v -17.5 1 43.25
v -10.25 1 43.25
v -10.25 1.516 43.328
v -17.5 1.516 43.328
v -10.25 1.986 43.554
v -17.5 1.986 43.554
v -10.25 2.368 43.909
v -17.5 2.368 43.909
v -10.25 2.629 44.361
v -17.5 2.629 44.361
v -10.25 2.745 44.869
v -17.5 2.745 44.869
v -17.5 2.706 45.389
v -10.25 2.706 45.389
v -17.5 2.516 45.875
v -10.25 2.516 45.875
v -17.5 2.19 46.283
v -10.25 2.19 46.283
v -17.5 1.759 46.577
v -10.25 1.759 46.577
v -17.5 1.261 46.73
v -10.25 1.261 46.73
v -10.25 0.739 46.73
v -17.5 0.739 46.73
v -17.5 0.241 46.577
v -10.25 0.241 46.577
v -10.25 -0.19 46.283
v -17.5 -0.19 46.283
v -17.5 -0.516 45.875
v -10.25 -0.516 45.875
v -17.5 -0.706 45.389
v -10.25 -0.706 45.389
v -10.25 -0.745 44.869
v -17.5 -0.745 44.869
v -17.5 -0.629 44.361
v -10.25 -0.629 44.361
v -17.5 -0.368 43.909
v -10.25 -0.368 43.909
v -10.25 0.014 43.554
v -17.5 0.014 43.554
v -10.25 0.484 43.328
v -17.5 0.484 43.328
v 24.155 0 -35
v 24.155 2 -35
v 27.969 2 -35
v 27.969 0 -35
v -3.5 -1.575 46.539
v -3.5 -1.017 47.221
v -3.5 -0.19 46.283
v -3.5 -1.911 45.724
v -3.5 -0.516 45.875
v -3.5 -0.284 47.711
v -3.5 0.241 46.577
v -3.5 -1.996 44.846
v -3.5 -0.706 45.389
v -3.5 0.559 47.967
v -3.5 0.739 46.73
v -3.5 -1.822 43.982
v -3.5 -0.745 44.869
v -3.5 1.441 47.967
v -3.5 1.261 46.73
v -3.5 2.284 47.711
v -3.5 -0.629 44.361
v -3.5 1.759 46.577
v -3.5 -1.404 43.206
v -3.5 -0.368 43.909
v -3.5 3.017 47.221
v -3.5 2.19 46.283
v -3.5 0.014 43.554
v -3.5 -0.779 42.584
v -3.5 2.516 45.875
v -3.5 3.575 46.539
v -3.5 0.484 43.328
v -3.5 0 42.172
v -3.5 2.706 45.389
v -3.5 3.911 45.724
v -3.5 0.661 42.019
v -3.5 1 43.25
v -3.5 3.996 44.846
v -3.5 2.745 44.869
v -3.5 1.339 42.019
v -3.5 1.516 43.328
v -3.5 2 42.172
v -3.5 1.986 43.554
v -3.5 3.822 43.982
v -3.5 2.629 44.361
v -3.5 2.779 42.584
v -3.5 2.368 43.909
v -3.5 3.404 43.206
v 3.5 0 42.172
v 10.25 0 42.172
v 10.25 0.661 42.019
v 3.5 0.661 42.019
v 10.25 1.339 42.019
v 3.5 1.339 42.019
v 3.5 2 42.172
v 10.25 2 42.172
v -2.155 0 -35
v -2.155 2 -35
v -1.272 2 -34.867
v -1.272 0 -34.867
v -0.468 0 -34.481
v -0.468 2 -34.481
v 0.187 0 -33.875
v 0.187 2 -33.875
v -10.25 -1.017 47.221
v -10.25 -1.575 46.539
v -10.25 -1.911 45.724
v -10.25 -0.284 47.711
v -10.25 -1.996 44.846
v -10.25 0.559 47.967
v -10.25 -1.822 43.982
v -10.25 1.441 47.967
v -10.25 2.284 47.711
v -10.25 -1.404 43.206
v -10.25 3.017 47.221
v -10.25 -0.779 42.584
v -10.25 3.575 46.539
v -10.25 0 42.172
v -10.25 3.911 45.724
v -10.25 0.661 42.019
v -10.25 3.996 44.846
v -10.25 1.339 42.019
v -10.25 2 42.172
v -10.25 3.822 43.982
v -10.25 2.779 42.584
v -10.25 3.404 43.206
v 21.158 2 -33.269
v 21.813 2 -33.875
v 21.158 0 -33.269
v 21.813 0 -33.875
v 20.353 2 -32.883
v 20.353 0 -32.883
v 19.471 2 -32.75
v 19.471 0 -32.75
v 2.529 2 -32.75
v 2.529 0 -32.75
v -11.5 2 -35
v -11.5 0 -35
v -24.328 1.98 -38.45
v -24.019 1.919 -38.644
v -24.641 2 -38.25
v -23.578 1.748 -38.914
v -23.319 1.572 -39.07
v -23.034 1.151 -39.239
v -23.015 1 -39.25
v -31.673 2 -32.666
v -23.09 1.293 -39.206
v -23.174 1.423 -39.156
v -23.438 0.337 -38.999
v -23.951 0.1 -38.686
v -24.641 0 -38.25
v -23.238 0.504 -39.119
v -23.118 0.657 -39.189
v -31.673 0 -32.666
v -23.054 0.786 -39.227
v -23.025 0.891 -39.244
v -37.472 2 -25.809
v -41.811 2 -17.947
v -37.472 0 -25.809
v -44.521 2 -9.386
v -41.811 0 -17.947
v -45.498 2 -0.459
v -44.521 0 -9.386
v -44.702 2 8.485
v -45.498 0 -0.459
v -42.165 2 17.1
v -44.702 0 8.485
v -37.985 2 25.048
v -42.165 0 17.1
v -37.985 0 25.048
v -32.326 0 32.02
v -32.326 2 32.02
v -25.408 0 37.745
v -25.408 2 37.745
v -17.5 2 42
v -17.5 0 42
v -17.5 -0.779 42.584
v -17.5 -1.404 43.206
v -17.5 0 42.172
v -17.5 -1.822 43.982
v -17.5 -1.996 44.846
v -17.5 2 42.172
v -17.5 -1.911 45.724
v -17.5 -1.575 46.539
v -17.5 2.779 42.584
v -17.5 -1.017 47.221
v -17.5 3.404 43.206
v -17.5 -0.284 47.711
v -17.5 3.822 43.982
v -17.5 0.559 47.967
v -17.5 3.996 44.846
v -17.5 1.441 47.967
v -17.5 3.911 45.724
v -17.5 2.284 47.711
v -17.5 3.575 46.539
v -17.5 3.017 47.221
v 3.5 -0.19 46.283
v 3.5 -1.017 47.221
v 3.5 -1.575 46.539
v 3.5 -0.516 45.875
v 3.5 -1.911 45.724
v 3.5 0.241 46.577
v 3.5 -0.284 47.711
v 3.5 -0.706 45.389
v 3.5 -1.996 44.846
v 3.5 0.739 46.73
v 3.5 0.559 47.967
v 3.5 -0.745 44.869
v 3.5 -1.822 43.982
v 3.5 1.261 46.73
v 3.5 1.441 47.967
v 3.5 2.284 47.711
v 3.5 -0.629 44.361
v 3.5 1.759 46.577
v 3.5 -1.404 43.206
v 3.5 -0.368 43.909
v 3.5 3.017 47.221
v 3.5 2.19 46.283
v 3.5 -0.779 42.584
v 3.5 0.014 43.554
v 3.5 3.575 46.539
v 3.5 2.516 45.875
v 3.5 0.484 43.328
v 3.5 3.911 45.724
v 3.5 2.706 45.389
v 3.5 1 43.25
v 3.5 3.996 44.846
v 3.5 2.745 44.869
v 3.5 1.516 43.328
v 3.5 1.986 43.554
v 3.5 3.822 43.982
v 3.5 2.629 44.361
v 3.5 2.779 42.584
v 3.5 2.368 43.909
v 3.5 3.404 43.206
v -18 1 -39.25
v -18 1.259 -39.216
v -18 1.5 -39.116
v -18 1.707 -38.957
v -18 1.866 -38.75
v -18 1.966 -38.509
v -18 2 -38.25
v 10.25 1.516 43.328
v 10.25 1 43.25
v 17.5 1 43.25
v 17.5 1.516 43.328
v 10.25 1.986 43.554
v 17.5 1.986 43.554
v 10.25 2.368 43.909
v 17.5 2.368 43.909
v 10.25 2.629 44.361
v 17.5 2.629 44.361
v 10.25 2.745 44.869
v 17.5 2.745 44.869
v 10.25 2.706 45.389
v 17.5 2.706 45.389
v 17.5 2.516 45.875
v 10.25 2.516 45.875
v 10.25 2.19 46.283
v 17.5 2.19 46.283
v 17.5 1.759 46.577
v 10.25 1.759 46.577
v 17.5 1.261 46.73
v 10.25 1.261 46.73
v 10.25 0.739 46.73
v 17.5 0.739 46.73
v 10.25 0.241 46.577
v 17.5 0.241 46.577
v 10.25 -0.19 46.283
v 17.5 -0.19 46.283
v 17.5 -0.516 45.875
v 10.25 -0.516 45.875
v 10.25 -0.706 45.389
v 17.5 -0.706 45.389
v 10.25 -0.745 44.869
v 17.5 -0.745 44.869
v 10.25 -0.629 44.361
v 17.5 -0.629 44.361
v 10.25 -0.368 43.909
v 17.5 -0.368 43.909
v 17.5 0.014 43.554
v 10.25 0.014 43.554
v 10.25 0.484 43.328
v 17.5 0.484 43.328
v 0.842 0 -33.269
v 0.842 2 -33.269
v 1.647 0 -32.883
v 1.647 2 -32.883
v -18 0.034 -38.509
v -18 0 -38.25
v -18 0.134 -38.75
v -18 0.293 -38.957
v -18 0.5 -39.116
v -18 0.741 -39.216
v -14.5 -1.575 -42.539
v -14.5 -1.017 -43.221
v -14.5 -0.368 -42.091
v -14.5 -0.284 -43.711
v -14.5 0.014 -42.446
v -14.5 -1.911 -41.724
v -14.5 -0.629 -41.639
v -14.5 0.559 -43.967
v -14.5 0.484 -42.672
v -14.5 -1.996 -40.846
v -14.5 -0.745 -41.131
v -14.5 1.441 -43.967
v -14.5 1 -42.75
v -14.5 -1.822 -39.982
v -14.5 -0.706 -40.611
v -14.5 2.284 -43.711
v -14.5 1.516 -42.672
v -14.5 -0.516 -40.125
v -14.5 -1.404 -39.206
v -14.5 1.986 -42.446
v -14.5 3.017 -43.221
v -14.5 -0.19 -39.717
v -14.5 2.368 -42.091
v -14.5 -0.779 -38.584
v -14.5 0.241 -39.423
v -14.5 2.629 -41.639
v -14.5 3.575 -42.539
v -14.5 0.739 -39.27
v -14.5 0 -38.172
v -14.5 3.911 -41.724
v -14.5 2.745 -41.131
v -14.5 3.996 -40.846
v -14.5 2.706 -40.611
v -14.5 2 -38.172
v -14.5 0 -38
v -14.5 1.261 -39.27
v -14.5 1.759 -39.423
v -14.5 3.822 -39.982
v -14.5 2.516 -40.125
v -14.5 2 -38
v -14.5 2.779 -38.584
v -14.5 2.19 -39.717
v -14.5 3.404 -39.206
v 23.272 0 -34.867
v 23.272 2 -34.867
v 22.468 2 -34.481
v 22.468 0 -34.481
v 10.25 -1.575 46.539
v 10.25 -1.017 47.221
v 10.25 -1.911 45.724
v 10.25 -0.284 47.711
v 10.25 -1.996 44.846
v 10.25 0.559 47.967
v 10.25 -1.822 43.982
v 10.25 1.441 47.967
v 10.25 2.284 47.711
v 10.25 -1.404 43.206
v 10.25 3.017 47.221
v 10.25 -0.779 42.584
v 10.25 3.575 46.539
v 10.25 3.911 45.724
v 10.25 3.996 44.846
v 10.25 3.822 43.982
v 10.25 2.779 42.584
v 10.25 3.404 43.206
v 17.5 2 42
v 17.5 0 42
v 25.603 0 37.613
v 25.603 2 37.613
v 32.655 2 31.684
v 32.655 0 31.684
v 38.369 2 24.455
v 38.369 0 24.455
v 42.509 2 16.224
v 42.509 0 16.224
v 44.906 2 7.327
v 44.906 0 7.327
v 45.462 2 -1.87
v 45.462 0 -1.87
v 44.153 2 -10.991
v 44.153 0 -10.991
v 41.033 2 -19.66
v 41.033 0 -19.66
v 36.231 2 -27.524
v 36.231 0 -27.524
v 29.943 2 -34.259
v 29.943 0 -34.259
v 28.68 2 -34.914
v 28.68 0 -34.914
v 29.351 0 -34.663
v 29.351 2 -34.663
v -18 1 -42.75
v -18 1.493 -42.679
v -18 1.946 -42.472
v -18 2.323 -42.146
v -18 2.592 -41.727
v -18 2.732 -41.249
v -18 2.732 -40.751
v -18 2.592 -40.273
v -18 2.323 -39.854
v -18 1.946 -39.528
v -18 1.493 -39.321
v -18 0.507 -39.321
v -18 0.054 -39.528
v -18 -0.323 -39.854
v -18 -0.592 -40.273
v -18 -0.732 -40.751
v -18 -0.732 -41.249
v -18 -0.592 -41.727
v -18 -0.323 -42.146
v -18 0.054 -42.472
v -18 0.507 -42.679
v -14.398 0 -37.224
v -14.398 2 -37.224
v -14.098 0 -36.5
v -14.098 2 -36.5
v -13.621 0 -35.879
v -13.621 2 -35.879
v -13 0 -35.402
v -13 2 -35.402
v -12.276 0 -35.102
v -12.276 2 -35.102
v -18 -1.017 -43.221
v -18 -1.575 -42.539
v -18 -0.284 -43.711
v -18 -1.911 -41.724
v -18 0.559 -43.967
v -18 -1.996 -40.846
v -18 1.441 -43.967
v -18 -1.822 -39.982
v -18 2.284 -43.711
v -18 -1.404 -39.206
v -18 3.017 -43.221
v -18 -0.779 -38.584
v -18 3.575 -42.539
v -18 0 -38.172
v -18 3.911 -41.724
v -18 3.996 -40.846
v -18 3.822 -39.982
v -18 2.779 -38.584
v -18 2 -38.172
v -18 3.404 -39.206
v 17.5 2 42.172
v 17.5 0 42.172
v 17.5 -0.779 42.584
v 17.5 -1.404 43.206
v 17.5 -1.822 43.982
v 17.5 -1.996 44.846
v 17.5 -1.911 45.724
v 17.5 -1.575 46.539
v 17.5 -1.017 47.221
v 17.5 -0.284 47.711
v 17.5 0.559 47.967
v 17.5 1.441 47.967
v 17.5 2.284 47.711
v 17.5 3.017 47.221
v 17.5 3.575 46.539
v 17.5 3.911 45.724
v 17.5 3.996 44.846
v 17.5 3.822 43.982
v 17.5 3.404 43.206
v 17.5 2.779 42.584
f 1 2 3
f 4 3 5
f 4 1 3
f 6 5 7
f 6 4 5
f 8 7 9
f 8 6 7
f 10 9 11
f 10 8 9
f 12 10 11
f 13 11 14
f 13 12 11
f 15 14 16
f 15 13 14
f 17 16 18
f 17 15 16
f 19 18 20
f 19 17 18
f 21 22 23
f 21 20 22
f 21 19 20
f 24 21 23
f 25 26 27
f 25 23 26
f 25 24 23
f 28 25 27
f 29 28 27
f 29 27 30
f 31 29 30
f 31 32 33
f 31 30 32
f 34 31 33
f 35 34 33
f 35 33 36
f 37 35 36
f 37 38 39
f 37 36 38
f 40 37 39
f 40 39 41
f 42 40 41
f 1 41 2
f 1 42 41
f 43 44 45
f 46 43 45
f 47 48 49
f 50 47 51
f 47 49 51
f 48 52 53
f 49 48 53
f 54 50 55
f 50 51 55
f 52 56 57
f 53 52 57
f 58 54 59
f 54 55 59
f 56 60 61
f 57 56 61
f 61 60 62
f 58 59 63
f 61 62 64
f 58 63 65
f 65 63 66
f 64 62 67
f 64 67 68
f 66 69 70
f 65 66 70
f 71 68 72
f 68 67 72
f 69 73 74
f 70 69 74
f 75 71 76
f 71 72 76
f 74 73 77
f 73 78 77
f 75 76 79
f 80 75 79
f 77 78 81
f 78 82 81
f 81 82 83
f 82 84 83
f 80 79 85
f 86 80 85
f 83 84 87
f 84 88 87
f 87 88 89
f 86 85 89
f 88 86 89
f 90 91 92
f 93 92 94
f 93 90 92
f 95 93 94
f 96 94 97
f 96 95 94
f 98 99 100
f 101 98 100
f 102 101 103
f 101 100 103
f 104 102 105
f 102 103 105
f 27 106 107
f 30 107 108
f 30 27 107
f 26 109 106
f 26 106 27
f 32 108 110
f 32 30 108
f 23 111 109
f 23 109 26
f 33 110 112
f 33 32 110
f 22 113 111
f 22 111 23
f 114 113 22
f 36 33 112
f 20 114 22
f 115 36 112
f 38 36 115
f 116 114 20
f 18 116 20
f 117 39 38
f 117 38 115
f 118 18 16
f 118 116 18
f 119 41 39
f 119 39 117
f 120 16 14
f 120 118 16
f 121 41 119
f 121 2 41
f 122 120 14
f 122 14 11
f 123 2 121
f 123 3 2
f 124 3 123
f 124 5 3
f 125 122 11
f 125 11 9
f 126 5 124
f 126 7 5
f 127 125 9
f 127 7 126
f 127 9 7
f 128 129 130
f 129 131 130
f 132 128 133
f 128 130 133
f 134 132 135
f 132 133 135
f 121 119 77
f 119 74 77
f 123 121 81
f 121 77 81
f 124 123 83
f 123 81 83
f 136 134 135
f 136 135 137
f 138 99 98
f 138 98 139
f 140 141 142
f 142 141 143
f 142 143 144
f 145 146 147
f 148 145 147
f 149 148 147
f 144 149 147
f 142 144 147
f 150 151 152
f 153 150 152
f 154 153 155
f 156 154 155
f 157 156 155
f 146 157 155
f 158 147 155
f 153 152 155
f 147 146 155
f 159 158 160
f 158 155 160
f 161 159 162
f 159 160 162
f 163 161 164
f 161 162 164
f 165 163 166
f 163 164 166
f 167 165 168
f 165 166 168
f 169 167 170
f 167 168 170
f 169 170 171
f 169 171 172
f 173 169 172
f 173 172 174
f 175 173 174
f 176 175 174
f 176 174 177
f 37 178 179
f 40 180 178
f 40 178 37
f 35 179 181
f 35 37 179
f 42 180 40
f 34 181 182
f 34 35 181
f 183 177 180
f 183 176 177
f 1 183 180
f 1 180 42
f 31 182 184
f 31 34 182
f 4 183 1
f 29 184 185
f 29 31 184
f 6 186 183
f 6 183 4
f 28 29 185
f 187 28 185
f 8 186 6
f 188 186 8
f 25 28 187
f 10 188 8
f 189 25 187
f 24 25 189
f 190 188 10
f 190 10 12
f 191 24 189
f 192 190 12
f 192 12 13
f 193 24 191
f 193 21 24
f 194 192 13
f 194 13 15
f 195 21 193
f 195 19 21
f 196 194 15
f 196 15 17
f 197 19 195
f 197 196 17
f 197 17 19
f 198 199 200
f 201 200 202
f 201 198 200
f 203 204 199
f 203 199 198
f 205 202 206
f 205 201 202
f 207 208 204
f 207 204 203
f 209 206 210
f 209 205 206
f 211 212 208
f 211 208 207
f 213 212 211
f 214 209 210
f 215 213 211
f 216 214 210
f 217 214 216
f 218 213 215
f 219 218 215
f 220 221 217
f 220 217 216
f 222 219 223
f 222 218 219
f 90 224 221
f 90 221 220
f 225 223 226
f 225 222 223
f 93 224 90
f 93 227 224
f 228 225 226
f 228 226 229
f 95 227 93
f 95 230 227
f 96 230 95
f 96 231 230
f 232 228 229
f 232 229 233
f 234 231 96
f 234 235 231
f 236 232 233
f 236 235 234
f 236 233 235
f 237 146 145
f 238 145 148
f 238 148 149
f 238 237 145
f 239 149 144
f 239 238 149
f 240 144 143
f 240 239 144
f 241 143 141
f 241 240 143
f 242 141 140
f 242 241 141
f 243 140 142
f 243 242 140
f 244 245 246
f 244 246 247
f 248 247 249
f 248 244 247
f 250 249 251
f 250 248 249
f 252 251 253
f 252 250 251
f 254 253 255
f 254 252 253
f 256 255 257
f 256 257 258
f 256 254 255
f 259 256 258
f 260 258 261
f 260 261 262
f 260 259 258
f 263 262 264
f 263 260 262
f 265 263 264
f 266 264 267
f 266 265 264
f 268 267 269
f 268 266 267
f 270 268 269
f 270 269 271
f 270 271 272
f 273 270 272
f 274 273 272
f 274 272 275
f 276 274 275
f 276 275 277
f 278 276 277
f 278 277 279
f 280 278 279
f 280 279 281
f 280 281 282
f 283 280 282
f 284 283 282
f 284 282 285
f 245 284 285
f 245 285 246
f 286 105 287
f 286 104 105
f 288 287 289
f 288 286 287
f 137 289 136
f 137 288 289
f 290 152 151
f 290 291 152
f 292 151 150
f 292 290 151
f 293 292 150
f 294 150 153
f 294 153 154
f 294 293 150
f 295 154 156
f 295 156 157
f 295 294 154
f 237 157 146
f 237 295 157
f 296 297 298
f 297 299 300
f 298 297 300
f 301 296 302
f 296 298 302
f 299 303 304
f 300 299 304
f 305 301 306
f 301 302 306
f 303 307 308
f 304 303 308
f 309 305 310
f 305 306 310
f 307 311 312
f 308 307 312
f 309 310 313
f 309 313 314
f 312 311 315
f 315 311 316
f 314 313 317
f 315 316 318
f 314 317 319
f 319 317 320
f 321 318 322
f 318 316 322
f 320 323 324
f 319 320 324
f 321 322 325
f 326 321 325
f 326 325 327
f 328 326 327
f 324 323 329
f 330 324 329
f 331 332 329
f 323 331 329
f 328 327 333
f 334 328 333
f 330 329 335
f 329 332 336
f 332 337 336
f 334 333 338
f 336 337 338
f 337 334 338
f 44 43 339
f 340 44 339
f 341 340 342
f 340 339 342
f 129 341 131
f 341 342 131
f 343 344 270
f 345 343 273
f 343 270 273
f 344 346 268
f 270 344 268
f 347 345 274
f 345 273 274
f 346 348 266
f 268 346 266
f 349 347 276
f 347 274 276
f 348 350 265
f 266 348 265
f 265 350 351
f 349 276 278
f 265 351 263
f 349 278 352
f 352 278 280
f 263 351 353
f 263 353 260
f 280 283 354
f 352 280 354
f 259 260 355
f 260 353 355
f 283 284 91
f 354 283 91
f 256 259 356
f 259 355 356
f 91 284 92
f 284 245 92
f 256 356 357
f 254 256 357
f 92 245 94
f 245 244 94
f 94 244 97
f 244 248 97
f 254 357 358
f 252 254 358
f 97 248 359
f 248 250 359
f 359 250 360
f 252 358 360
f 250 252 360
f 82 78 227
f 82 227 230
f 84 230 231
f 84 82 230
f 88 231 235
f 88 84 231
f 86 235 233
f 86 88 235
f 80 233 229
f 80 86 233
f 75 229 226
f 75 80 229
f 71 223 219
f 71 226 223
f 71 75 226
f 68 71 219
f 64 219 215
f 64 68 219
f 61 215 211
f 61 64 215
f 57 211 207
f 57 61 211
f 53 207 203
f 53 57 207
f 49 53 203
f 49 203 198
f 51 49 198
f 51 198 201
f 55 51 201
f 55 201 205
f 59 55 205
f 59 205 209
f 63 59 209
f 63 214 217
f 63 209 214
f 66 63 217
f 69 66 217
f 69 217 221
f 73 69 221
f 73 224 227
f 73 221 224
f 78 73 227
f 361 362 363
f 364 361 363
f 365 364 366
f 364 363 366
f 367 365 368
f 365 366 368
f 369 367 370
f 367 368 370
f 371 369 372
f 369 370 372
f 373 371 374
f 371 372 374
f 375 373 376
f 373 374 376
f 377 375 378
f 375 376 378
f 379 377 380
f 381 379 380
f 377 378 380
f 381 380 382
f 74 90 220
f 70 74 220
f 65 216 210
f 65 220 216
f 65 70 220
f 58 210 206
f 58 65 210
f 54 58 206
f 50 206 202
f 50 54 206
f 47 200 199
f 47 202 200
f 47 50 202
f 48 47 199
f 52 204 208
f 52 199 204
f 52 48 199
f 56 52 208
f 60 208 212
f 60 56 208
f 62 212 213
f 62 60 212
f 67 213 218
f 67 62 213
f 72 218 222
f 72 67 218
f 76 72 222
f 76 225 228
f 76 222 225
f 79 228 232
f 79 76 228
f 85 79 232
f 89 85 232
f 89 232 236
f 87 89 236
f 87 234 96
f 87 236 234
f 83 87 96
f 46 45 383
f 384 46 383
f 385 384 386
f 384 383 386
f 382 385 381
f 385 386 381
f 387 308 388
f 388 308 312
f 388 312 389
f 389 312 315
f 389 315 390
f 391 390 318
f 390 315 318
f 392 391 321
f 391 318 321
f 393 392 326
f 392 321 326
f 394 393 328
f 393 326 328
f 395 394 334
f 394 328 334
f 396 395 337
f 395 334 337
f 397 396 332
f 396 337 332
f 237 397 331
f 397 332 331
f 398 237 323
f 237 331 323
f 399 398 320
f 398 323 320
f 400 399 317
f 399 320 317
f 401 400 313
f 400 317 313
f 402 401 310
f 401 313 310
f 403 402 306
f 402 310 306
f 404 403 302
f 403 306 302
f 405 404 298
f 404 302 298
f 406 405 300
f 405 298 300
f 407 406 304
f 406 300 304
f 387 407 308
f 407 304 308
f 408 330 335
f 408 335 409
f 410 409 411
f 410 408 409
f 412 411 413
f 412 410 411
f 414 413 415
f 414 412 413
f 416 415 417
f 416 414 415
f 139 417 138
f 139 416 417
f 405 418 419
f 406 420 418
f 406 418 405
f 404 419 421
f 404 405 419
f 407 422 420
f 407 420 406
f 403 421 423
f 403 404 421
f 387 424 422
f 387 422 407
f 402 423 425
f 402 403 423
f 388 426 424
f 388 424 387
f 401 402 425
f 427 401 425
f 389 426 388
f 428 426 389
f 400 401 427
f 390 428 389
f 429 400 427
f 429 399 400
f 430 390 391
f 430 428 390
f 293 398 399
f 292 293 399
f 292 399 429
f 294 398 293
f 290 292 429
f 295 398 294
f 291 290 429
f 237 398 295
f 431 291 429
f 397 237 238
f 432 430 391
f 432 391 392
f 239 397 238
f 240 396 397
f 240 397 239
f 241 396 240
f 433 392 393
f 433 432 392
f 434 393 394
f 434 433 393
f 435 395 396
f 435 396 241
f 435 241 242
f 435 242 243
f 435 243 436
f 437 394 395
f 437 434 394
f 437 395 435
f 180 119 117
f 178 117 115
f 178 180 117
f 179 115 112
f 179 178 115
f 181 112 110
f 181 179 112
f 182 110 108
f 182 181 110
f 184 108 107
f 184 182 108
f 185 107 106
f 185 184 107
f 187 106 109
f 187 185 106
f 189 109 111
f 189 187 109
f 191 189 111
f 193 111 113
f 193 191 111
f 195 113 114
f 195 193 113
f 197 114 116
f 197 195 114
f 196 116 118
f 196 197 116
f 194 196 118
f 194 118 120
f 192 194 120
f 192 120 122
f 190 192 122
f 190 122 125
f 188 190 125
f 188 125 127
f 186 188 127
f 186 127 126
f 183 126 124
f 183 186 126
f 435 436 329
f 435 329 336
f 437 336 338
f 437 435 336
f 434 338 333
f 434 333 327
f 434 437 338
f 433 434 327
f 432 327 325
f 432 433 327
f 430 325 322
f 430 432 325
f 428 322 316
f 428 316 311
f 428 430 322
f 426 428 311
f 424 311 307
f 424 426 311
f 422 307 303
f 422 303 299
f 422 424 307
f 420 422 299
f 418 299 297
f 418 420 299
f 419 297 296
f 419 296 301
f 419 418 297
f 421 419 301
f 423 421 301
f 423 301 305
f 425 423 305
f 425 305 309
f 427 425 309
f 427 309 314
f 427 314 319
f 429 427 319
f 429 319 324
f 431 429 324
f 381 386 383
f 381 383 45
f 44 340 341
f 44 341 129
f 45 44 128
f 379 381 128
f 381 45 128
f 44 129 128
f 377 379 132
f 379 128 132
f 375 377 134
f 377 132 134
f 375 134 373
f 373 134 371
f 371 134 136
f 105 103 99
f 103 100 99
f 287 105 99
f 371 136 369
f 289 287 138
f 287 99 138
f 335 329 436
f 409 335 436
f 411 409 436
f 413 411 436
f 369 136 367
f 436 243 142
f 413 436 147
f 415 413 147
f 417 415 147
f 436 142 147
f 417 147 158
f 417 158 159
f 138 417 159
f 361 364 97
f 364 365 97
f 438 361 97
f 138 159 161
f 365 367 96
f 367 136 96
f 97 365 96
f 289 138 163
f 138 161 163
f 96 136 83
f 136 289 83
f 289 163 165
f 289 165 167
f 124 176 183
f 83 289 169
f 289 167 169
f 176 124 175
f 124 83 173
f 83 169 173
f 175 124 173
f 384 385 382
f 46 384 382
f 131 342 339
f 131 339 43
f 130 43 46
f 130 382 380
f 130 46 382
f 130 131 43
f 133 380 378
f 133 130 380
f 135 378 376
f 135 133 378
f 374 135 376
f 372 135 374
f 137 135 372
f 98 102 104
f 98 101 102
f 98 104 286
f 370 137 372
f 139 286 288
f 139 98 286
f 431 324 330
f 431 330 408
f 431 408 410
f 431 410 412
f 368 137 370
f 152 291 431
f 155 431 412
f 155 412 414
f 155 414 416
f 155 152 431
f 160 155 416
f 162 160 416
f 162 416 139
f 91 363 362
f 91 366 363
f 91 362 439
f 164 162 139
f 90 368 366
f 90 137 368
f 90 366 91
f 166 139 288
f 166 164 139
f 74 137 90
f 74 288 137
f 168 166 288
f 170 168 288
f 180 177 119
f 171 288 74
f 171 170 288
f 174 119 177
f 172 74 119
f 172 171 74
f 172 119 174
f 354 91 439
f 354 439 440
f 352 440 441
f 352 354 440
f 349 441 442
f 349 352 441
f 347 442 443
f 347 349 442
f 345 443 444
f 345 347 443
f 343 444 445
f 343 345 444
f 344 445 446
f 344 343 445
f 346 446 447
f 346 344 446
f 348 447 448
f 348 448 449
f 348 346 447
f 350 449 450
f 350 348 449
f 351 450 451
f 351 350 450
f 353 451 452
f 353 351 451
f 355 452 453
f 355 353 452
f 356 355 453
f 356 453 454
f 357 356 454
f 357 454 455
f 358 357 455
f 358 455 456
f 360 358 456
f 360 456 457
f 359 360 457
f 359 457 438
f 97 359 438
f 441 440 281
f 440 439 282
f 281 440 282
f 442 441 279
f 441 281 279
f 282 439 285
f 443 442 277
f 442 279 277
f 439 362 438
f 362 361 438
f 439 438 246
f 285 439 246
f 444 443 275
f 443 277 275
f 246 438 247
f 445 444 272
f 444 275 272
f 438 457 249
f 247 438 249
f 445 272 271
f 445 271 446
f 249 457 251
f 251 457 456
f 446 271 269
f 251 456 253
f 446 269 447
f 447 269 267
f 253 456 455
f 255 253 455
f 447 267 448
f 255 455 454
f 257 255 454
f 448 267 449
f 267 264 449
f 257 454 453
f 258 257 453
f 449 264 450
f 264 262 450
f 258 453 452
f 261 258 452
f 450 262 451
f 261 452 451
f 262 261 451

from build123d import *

# Parameters (mm, degrees)
BOSS_EXTRUDE1_DEPTH = 2
BOSS_EXTRUDE2_START = -17.5
SKETCH2_R           = 1.75
BOSS_EXTRUDE2_DEPTH = 35
SKETCH3_R           = 3
CUT_EXTRUDE1_DEPTH  = 6.75
CUT_EXTRUDE2_DEPTH  = 2
BOSS_EXTRUDE4_START = -0.5
BOSS_EXTRUDE4_DEPTH = 3.5
SKETCH6_R           = 1.75
CUT_EXTRUDE3_DEPTH  = 77.941536247
FILLET1_R           = 1
SKETCH7_W           = 9
SKETCH7_H           = 6
CUT_EXTRUDE4_DEPTH  = 2
FILLET2_R           = 3
FILLET3_R           = 3


# Some blends are built 0.0001 mm under size
with BuildPart() as part:
    # Sketch1 → Boss-Extrude1 (new body)
    with BuildSketch(Plane(origin=(0, 0, 0), x_dir=(1, 0, 0), z_dir=(0, 1, 0))):
        with BuildLine():
            Line((-17.5, -42), (17.5, -42))
            ThreePointArc((17.5, -42), (45.5, 0), (17.5, 42))
            Line((17.5, 42), (-17.5, 42))
            ThreePointArc((-17.5, 42), (-45.5, 0), (-17.5, -42))
        make_face()
    extrude(amount=BOSS_EXTRUDE1_DEPTH)

    # Sketch2 → Boss-Extrude2 (add)
    with BuildSketch(Plane(origin=(0, 0, 0), x_dir=(0, 0, -1), z_dir=(1, 0, 0)).offset(BOSS_EXTRUDE2_START)):
        with BuildLine():
            Line((-42, 0), (-42.171572875, 0))
            ThreePointArc((-42.171572875, 0), (-48, 1), (-42.171572875, 2))
            Line((-42.171572875, 2), (-42, 2))
            Line((-42, 2), (-42, 1))
            Line((-42, 1), (-42, 0))
        make_face()
        with Locations((-45, 1)):
            Circle(SKETCH2_R, mode=Mode.SUBTRACT)
    extrude(amount=BOSS_EXTRUDE2_DEPTH)

    # Sketch3 → Cut-Extrude1 (cut)
    with BuildSketch(Plane(origin=(3.5, 0, 0), x_dir=(0, 0, -1), z_dir=(1, 0, 0))):
        with Locations((-45, 1)):
            Circle(SKETCH3_R)
    cut_extrude1 = extrude(amount=CUT_EXTRUDE1_DEPTH, mode=Mode.SUBTRACT)

    # Mirror1: Cut-Extrude1 across plane
    add(cut_extrude1.mirror(Plane(origin=(0, 0, 0), x_dir=(0, 0, 1), z_dir=(1, 0, 0))), mode=Mode.SUBTRACT)

    # Sketch4 → Cut-Extrude2 (cut)
    with BuildSketch(Plane(origin=(0, 2, 0), x_dir=(1, 0, 0), z_dir=(0, 1, 0))):
        Polygon((0.75, 42), (21.25, 42), (21.25, 32.75), (0.75, 32.75), (0.75, 35), (-17.5, 35), (-17.5, 42), align=None)
    extrude(amount=-CUT_EXTRUDE2_DEPTH, mode=Mode.SUBTRACT)

    # Sketch5 → Boss-Extrude4 (add)
    with BuildSketch(Plane(origin=(-17.5, 0, 0), x_dir=(0, 0, -1), z_dir=(1, 0, 0)).offset(BOSS_EXTRUDE4_START)):
        with BuildLine():
            Line((35, 1), (35, 2))
            Line((35, 2), (38.171572875, 2))
            ThreePointArc((38.171572875, 2), (44, 1), (38.171572875, 0))
            Line((38.171572875, 0), (35, 0))
            Line((35, 0), (35, 1))
        make_face()
    extrude(amount=BOSS_EXTRUDE4_DEPTH)

    # Sketch6 → Cut-Extrude3 (cut, through all)
    with BuildSketch(Plane(origin=(-14.5, 0, 0), x_dir=(0, 0, -1), z_dir=(1, 0, 0))):
        with Locations((41, 1)):
            Circle(SKETCH6_R)
    extrude(amount=-CUT_EXTRUDE3_DEPTH, mode=Mode.SUBTRACT)

    # Fillet1
    fillet1_edges = [part.edges().sort_by_distance(p)[0] for p in [
        (-20.235557777, 0, -39.563859338),
        (-20.235557777, 2, -39.563859338),
    ]]
    fillet(fillet1_edges, radius=FILLET1_R - 0.0001)  # a hair under: the kernel refuses the full size

    # Sketch7 → Cut-Extrude4 (cut)
    with BuildSketch(Plane(origin=(0, 2, 0), x_dir=(1, 0, 0), z_dir=(0, 1, 0))):
        with Locations((24.75, 38)):
            Rectangle(SKETCH7_W, SKETCH7_H)
    extrude(amount=-CUT_EXTRUDE4_DEPTH, mode=Mode.SUBTRACT)

    # Fillet2
    # the kernel refuses this fillet: 3 mm, written as the material it adds along each edge
    with BuildSketch(Plane(origin=(-14.5, 0, -35), x_dir=(0, 0, -1), z_dir=(0, 1, 0))) as fillet2_piece_1:
        with BuildLine():
            CenterArc((FILLET2_R, -FILLET2_R), FILLET2_R, 90, 90)
            Line((0, -FILLET2_R), (0, 0))
            Line((0, 0), (FILLET2_R, 0))
        make_face()
    extrude(amount=2)
    # the kernel refuses this fillet: 3 mm, written as the material it takes off along each edge
    with BuildSketch(Plane(origin=(29.07318352, 4.856917414, -35), x_dir=(-1, 0, 0), z_dir=(0, -1, 0))) as fillet2_2_piece_1:
        with BuildLine():
            CenterArc((1.104450978, -3), FILLET2_R, 90, 41.15420196)
            ThreePointArc((-0.869812495, -0.741176471), (-0.43723324, -0.367857378), (0, 0))
            Line((0, 0), (1.104450978, 0))
        make_face()
    extrude(amount=7.713834827, mode=Mode.SUBTRACT)
    with BuildSketch(Plane(origin=(21.25, -7.261843774, -35), x_dir=(0, 0, 1), z_dir=(0, 1, 0))) as fillet2_2_piece_2:
        with BuildLine():
            CenterArc((3, 2.90473751), FILLET2_R, 180, 75.522487814)
            Line((0, 2.90473751), (0, 0))
            Line((0, 0), (2.25, 0))
        make_face()
    extrude(amount=16.523687548, mode=Mode.SUBTRACT)
    with BuildSketch(Plane(origin=(0.75, 9.261843774, -35), x_dir=(-1, 0, 0), z_dir=(0, -1, 0))) as fillet2_2_piece_3:
        with BuildLine():
            CenterArc((2.90473751, -3), FILLET2_R, 90, 75.522487814)
            Line((0, -2.25), (0, 0))
            Line((0, 0), (2.90473751, 0))
        make_face()
    extrude(amount=16.523687548, mode=Mode.SUBTRACT)

    # Fillet3
    fillet3_edges = [part.edges().sort_by_distance(p)[0] for p in [
        (21.25, 1, -32.75),
        (0.75, 1, -32.75),
    ]]
    fillet(fillet3_edges, radius=FILLET3_R)


solid = part.part
